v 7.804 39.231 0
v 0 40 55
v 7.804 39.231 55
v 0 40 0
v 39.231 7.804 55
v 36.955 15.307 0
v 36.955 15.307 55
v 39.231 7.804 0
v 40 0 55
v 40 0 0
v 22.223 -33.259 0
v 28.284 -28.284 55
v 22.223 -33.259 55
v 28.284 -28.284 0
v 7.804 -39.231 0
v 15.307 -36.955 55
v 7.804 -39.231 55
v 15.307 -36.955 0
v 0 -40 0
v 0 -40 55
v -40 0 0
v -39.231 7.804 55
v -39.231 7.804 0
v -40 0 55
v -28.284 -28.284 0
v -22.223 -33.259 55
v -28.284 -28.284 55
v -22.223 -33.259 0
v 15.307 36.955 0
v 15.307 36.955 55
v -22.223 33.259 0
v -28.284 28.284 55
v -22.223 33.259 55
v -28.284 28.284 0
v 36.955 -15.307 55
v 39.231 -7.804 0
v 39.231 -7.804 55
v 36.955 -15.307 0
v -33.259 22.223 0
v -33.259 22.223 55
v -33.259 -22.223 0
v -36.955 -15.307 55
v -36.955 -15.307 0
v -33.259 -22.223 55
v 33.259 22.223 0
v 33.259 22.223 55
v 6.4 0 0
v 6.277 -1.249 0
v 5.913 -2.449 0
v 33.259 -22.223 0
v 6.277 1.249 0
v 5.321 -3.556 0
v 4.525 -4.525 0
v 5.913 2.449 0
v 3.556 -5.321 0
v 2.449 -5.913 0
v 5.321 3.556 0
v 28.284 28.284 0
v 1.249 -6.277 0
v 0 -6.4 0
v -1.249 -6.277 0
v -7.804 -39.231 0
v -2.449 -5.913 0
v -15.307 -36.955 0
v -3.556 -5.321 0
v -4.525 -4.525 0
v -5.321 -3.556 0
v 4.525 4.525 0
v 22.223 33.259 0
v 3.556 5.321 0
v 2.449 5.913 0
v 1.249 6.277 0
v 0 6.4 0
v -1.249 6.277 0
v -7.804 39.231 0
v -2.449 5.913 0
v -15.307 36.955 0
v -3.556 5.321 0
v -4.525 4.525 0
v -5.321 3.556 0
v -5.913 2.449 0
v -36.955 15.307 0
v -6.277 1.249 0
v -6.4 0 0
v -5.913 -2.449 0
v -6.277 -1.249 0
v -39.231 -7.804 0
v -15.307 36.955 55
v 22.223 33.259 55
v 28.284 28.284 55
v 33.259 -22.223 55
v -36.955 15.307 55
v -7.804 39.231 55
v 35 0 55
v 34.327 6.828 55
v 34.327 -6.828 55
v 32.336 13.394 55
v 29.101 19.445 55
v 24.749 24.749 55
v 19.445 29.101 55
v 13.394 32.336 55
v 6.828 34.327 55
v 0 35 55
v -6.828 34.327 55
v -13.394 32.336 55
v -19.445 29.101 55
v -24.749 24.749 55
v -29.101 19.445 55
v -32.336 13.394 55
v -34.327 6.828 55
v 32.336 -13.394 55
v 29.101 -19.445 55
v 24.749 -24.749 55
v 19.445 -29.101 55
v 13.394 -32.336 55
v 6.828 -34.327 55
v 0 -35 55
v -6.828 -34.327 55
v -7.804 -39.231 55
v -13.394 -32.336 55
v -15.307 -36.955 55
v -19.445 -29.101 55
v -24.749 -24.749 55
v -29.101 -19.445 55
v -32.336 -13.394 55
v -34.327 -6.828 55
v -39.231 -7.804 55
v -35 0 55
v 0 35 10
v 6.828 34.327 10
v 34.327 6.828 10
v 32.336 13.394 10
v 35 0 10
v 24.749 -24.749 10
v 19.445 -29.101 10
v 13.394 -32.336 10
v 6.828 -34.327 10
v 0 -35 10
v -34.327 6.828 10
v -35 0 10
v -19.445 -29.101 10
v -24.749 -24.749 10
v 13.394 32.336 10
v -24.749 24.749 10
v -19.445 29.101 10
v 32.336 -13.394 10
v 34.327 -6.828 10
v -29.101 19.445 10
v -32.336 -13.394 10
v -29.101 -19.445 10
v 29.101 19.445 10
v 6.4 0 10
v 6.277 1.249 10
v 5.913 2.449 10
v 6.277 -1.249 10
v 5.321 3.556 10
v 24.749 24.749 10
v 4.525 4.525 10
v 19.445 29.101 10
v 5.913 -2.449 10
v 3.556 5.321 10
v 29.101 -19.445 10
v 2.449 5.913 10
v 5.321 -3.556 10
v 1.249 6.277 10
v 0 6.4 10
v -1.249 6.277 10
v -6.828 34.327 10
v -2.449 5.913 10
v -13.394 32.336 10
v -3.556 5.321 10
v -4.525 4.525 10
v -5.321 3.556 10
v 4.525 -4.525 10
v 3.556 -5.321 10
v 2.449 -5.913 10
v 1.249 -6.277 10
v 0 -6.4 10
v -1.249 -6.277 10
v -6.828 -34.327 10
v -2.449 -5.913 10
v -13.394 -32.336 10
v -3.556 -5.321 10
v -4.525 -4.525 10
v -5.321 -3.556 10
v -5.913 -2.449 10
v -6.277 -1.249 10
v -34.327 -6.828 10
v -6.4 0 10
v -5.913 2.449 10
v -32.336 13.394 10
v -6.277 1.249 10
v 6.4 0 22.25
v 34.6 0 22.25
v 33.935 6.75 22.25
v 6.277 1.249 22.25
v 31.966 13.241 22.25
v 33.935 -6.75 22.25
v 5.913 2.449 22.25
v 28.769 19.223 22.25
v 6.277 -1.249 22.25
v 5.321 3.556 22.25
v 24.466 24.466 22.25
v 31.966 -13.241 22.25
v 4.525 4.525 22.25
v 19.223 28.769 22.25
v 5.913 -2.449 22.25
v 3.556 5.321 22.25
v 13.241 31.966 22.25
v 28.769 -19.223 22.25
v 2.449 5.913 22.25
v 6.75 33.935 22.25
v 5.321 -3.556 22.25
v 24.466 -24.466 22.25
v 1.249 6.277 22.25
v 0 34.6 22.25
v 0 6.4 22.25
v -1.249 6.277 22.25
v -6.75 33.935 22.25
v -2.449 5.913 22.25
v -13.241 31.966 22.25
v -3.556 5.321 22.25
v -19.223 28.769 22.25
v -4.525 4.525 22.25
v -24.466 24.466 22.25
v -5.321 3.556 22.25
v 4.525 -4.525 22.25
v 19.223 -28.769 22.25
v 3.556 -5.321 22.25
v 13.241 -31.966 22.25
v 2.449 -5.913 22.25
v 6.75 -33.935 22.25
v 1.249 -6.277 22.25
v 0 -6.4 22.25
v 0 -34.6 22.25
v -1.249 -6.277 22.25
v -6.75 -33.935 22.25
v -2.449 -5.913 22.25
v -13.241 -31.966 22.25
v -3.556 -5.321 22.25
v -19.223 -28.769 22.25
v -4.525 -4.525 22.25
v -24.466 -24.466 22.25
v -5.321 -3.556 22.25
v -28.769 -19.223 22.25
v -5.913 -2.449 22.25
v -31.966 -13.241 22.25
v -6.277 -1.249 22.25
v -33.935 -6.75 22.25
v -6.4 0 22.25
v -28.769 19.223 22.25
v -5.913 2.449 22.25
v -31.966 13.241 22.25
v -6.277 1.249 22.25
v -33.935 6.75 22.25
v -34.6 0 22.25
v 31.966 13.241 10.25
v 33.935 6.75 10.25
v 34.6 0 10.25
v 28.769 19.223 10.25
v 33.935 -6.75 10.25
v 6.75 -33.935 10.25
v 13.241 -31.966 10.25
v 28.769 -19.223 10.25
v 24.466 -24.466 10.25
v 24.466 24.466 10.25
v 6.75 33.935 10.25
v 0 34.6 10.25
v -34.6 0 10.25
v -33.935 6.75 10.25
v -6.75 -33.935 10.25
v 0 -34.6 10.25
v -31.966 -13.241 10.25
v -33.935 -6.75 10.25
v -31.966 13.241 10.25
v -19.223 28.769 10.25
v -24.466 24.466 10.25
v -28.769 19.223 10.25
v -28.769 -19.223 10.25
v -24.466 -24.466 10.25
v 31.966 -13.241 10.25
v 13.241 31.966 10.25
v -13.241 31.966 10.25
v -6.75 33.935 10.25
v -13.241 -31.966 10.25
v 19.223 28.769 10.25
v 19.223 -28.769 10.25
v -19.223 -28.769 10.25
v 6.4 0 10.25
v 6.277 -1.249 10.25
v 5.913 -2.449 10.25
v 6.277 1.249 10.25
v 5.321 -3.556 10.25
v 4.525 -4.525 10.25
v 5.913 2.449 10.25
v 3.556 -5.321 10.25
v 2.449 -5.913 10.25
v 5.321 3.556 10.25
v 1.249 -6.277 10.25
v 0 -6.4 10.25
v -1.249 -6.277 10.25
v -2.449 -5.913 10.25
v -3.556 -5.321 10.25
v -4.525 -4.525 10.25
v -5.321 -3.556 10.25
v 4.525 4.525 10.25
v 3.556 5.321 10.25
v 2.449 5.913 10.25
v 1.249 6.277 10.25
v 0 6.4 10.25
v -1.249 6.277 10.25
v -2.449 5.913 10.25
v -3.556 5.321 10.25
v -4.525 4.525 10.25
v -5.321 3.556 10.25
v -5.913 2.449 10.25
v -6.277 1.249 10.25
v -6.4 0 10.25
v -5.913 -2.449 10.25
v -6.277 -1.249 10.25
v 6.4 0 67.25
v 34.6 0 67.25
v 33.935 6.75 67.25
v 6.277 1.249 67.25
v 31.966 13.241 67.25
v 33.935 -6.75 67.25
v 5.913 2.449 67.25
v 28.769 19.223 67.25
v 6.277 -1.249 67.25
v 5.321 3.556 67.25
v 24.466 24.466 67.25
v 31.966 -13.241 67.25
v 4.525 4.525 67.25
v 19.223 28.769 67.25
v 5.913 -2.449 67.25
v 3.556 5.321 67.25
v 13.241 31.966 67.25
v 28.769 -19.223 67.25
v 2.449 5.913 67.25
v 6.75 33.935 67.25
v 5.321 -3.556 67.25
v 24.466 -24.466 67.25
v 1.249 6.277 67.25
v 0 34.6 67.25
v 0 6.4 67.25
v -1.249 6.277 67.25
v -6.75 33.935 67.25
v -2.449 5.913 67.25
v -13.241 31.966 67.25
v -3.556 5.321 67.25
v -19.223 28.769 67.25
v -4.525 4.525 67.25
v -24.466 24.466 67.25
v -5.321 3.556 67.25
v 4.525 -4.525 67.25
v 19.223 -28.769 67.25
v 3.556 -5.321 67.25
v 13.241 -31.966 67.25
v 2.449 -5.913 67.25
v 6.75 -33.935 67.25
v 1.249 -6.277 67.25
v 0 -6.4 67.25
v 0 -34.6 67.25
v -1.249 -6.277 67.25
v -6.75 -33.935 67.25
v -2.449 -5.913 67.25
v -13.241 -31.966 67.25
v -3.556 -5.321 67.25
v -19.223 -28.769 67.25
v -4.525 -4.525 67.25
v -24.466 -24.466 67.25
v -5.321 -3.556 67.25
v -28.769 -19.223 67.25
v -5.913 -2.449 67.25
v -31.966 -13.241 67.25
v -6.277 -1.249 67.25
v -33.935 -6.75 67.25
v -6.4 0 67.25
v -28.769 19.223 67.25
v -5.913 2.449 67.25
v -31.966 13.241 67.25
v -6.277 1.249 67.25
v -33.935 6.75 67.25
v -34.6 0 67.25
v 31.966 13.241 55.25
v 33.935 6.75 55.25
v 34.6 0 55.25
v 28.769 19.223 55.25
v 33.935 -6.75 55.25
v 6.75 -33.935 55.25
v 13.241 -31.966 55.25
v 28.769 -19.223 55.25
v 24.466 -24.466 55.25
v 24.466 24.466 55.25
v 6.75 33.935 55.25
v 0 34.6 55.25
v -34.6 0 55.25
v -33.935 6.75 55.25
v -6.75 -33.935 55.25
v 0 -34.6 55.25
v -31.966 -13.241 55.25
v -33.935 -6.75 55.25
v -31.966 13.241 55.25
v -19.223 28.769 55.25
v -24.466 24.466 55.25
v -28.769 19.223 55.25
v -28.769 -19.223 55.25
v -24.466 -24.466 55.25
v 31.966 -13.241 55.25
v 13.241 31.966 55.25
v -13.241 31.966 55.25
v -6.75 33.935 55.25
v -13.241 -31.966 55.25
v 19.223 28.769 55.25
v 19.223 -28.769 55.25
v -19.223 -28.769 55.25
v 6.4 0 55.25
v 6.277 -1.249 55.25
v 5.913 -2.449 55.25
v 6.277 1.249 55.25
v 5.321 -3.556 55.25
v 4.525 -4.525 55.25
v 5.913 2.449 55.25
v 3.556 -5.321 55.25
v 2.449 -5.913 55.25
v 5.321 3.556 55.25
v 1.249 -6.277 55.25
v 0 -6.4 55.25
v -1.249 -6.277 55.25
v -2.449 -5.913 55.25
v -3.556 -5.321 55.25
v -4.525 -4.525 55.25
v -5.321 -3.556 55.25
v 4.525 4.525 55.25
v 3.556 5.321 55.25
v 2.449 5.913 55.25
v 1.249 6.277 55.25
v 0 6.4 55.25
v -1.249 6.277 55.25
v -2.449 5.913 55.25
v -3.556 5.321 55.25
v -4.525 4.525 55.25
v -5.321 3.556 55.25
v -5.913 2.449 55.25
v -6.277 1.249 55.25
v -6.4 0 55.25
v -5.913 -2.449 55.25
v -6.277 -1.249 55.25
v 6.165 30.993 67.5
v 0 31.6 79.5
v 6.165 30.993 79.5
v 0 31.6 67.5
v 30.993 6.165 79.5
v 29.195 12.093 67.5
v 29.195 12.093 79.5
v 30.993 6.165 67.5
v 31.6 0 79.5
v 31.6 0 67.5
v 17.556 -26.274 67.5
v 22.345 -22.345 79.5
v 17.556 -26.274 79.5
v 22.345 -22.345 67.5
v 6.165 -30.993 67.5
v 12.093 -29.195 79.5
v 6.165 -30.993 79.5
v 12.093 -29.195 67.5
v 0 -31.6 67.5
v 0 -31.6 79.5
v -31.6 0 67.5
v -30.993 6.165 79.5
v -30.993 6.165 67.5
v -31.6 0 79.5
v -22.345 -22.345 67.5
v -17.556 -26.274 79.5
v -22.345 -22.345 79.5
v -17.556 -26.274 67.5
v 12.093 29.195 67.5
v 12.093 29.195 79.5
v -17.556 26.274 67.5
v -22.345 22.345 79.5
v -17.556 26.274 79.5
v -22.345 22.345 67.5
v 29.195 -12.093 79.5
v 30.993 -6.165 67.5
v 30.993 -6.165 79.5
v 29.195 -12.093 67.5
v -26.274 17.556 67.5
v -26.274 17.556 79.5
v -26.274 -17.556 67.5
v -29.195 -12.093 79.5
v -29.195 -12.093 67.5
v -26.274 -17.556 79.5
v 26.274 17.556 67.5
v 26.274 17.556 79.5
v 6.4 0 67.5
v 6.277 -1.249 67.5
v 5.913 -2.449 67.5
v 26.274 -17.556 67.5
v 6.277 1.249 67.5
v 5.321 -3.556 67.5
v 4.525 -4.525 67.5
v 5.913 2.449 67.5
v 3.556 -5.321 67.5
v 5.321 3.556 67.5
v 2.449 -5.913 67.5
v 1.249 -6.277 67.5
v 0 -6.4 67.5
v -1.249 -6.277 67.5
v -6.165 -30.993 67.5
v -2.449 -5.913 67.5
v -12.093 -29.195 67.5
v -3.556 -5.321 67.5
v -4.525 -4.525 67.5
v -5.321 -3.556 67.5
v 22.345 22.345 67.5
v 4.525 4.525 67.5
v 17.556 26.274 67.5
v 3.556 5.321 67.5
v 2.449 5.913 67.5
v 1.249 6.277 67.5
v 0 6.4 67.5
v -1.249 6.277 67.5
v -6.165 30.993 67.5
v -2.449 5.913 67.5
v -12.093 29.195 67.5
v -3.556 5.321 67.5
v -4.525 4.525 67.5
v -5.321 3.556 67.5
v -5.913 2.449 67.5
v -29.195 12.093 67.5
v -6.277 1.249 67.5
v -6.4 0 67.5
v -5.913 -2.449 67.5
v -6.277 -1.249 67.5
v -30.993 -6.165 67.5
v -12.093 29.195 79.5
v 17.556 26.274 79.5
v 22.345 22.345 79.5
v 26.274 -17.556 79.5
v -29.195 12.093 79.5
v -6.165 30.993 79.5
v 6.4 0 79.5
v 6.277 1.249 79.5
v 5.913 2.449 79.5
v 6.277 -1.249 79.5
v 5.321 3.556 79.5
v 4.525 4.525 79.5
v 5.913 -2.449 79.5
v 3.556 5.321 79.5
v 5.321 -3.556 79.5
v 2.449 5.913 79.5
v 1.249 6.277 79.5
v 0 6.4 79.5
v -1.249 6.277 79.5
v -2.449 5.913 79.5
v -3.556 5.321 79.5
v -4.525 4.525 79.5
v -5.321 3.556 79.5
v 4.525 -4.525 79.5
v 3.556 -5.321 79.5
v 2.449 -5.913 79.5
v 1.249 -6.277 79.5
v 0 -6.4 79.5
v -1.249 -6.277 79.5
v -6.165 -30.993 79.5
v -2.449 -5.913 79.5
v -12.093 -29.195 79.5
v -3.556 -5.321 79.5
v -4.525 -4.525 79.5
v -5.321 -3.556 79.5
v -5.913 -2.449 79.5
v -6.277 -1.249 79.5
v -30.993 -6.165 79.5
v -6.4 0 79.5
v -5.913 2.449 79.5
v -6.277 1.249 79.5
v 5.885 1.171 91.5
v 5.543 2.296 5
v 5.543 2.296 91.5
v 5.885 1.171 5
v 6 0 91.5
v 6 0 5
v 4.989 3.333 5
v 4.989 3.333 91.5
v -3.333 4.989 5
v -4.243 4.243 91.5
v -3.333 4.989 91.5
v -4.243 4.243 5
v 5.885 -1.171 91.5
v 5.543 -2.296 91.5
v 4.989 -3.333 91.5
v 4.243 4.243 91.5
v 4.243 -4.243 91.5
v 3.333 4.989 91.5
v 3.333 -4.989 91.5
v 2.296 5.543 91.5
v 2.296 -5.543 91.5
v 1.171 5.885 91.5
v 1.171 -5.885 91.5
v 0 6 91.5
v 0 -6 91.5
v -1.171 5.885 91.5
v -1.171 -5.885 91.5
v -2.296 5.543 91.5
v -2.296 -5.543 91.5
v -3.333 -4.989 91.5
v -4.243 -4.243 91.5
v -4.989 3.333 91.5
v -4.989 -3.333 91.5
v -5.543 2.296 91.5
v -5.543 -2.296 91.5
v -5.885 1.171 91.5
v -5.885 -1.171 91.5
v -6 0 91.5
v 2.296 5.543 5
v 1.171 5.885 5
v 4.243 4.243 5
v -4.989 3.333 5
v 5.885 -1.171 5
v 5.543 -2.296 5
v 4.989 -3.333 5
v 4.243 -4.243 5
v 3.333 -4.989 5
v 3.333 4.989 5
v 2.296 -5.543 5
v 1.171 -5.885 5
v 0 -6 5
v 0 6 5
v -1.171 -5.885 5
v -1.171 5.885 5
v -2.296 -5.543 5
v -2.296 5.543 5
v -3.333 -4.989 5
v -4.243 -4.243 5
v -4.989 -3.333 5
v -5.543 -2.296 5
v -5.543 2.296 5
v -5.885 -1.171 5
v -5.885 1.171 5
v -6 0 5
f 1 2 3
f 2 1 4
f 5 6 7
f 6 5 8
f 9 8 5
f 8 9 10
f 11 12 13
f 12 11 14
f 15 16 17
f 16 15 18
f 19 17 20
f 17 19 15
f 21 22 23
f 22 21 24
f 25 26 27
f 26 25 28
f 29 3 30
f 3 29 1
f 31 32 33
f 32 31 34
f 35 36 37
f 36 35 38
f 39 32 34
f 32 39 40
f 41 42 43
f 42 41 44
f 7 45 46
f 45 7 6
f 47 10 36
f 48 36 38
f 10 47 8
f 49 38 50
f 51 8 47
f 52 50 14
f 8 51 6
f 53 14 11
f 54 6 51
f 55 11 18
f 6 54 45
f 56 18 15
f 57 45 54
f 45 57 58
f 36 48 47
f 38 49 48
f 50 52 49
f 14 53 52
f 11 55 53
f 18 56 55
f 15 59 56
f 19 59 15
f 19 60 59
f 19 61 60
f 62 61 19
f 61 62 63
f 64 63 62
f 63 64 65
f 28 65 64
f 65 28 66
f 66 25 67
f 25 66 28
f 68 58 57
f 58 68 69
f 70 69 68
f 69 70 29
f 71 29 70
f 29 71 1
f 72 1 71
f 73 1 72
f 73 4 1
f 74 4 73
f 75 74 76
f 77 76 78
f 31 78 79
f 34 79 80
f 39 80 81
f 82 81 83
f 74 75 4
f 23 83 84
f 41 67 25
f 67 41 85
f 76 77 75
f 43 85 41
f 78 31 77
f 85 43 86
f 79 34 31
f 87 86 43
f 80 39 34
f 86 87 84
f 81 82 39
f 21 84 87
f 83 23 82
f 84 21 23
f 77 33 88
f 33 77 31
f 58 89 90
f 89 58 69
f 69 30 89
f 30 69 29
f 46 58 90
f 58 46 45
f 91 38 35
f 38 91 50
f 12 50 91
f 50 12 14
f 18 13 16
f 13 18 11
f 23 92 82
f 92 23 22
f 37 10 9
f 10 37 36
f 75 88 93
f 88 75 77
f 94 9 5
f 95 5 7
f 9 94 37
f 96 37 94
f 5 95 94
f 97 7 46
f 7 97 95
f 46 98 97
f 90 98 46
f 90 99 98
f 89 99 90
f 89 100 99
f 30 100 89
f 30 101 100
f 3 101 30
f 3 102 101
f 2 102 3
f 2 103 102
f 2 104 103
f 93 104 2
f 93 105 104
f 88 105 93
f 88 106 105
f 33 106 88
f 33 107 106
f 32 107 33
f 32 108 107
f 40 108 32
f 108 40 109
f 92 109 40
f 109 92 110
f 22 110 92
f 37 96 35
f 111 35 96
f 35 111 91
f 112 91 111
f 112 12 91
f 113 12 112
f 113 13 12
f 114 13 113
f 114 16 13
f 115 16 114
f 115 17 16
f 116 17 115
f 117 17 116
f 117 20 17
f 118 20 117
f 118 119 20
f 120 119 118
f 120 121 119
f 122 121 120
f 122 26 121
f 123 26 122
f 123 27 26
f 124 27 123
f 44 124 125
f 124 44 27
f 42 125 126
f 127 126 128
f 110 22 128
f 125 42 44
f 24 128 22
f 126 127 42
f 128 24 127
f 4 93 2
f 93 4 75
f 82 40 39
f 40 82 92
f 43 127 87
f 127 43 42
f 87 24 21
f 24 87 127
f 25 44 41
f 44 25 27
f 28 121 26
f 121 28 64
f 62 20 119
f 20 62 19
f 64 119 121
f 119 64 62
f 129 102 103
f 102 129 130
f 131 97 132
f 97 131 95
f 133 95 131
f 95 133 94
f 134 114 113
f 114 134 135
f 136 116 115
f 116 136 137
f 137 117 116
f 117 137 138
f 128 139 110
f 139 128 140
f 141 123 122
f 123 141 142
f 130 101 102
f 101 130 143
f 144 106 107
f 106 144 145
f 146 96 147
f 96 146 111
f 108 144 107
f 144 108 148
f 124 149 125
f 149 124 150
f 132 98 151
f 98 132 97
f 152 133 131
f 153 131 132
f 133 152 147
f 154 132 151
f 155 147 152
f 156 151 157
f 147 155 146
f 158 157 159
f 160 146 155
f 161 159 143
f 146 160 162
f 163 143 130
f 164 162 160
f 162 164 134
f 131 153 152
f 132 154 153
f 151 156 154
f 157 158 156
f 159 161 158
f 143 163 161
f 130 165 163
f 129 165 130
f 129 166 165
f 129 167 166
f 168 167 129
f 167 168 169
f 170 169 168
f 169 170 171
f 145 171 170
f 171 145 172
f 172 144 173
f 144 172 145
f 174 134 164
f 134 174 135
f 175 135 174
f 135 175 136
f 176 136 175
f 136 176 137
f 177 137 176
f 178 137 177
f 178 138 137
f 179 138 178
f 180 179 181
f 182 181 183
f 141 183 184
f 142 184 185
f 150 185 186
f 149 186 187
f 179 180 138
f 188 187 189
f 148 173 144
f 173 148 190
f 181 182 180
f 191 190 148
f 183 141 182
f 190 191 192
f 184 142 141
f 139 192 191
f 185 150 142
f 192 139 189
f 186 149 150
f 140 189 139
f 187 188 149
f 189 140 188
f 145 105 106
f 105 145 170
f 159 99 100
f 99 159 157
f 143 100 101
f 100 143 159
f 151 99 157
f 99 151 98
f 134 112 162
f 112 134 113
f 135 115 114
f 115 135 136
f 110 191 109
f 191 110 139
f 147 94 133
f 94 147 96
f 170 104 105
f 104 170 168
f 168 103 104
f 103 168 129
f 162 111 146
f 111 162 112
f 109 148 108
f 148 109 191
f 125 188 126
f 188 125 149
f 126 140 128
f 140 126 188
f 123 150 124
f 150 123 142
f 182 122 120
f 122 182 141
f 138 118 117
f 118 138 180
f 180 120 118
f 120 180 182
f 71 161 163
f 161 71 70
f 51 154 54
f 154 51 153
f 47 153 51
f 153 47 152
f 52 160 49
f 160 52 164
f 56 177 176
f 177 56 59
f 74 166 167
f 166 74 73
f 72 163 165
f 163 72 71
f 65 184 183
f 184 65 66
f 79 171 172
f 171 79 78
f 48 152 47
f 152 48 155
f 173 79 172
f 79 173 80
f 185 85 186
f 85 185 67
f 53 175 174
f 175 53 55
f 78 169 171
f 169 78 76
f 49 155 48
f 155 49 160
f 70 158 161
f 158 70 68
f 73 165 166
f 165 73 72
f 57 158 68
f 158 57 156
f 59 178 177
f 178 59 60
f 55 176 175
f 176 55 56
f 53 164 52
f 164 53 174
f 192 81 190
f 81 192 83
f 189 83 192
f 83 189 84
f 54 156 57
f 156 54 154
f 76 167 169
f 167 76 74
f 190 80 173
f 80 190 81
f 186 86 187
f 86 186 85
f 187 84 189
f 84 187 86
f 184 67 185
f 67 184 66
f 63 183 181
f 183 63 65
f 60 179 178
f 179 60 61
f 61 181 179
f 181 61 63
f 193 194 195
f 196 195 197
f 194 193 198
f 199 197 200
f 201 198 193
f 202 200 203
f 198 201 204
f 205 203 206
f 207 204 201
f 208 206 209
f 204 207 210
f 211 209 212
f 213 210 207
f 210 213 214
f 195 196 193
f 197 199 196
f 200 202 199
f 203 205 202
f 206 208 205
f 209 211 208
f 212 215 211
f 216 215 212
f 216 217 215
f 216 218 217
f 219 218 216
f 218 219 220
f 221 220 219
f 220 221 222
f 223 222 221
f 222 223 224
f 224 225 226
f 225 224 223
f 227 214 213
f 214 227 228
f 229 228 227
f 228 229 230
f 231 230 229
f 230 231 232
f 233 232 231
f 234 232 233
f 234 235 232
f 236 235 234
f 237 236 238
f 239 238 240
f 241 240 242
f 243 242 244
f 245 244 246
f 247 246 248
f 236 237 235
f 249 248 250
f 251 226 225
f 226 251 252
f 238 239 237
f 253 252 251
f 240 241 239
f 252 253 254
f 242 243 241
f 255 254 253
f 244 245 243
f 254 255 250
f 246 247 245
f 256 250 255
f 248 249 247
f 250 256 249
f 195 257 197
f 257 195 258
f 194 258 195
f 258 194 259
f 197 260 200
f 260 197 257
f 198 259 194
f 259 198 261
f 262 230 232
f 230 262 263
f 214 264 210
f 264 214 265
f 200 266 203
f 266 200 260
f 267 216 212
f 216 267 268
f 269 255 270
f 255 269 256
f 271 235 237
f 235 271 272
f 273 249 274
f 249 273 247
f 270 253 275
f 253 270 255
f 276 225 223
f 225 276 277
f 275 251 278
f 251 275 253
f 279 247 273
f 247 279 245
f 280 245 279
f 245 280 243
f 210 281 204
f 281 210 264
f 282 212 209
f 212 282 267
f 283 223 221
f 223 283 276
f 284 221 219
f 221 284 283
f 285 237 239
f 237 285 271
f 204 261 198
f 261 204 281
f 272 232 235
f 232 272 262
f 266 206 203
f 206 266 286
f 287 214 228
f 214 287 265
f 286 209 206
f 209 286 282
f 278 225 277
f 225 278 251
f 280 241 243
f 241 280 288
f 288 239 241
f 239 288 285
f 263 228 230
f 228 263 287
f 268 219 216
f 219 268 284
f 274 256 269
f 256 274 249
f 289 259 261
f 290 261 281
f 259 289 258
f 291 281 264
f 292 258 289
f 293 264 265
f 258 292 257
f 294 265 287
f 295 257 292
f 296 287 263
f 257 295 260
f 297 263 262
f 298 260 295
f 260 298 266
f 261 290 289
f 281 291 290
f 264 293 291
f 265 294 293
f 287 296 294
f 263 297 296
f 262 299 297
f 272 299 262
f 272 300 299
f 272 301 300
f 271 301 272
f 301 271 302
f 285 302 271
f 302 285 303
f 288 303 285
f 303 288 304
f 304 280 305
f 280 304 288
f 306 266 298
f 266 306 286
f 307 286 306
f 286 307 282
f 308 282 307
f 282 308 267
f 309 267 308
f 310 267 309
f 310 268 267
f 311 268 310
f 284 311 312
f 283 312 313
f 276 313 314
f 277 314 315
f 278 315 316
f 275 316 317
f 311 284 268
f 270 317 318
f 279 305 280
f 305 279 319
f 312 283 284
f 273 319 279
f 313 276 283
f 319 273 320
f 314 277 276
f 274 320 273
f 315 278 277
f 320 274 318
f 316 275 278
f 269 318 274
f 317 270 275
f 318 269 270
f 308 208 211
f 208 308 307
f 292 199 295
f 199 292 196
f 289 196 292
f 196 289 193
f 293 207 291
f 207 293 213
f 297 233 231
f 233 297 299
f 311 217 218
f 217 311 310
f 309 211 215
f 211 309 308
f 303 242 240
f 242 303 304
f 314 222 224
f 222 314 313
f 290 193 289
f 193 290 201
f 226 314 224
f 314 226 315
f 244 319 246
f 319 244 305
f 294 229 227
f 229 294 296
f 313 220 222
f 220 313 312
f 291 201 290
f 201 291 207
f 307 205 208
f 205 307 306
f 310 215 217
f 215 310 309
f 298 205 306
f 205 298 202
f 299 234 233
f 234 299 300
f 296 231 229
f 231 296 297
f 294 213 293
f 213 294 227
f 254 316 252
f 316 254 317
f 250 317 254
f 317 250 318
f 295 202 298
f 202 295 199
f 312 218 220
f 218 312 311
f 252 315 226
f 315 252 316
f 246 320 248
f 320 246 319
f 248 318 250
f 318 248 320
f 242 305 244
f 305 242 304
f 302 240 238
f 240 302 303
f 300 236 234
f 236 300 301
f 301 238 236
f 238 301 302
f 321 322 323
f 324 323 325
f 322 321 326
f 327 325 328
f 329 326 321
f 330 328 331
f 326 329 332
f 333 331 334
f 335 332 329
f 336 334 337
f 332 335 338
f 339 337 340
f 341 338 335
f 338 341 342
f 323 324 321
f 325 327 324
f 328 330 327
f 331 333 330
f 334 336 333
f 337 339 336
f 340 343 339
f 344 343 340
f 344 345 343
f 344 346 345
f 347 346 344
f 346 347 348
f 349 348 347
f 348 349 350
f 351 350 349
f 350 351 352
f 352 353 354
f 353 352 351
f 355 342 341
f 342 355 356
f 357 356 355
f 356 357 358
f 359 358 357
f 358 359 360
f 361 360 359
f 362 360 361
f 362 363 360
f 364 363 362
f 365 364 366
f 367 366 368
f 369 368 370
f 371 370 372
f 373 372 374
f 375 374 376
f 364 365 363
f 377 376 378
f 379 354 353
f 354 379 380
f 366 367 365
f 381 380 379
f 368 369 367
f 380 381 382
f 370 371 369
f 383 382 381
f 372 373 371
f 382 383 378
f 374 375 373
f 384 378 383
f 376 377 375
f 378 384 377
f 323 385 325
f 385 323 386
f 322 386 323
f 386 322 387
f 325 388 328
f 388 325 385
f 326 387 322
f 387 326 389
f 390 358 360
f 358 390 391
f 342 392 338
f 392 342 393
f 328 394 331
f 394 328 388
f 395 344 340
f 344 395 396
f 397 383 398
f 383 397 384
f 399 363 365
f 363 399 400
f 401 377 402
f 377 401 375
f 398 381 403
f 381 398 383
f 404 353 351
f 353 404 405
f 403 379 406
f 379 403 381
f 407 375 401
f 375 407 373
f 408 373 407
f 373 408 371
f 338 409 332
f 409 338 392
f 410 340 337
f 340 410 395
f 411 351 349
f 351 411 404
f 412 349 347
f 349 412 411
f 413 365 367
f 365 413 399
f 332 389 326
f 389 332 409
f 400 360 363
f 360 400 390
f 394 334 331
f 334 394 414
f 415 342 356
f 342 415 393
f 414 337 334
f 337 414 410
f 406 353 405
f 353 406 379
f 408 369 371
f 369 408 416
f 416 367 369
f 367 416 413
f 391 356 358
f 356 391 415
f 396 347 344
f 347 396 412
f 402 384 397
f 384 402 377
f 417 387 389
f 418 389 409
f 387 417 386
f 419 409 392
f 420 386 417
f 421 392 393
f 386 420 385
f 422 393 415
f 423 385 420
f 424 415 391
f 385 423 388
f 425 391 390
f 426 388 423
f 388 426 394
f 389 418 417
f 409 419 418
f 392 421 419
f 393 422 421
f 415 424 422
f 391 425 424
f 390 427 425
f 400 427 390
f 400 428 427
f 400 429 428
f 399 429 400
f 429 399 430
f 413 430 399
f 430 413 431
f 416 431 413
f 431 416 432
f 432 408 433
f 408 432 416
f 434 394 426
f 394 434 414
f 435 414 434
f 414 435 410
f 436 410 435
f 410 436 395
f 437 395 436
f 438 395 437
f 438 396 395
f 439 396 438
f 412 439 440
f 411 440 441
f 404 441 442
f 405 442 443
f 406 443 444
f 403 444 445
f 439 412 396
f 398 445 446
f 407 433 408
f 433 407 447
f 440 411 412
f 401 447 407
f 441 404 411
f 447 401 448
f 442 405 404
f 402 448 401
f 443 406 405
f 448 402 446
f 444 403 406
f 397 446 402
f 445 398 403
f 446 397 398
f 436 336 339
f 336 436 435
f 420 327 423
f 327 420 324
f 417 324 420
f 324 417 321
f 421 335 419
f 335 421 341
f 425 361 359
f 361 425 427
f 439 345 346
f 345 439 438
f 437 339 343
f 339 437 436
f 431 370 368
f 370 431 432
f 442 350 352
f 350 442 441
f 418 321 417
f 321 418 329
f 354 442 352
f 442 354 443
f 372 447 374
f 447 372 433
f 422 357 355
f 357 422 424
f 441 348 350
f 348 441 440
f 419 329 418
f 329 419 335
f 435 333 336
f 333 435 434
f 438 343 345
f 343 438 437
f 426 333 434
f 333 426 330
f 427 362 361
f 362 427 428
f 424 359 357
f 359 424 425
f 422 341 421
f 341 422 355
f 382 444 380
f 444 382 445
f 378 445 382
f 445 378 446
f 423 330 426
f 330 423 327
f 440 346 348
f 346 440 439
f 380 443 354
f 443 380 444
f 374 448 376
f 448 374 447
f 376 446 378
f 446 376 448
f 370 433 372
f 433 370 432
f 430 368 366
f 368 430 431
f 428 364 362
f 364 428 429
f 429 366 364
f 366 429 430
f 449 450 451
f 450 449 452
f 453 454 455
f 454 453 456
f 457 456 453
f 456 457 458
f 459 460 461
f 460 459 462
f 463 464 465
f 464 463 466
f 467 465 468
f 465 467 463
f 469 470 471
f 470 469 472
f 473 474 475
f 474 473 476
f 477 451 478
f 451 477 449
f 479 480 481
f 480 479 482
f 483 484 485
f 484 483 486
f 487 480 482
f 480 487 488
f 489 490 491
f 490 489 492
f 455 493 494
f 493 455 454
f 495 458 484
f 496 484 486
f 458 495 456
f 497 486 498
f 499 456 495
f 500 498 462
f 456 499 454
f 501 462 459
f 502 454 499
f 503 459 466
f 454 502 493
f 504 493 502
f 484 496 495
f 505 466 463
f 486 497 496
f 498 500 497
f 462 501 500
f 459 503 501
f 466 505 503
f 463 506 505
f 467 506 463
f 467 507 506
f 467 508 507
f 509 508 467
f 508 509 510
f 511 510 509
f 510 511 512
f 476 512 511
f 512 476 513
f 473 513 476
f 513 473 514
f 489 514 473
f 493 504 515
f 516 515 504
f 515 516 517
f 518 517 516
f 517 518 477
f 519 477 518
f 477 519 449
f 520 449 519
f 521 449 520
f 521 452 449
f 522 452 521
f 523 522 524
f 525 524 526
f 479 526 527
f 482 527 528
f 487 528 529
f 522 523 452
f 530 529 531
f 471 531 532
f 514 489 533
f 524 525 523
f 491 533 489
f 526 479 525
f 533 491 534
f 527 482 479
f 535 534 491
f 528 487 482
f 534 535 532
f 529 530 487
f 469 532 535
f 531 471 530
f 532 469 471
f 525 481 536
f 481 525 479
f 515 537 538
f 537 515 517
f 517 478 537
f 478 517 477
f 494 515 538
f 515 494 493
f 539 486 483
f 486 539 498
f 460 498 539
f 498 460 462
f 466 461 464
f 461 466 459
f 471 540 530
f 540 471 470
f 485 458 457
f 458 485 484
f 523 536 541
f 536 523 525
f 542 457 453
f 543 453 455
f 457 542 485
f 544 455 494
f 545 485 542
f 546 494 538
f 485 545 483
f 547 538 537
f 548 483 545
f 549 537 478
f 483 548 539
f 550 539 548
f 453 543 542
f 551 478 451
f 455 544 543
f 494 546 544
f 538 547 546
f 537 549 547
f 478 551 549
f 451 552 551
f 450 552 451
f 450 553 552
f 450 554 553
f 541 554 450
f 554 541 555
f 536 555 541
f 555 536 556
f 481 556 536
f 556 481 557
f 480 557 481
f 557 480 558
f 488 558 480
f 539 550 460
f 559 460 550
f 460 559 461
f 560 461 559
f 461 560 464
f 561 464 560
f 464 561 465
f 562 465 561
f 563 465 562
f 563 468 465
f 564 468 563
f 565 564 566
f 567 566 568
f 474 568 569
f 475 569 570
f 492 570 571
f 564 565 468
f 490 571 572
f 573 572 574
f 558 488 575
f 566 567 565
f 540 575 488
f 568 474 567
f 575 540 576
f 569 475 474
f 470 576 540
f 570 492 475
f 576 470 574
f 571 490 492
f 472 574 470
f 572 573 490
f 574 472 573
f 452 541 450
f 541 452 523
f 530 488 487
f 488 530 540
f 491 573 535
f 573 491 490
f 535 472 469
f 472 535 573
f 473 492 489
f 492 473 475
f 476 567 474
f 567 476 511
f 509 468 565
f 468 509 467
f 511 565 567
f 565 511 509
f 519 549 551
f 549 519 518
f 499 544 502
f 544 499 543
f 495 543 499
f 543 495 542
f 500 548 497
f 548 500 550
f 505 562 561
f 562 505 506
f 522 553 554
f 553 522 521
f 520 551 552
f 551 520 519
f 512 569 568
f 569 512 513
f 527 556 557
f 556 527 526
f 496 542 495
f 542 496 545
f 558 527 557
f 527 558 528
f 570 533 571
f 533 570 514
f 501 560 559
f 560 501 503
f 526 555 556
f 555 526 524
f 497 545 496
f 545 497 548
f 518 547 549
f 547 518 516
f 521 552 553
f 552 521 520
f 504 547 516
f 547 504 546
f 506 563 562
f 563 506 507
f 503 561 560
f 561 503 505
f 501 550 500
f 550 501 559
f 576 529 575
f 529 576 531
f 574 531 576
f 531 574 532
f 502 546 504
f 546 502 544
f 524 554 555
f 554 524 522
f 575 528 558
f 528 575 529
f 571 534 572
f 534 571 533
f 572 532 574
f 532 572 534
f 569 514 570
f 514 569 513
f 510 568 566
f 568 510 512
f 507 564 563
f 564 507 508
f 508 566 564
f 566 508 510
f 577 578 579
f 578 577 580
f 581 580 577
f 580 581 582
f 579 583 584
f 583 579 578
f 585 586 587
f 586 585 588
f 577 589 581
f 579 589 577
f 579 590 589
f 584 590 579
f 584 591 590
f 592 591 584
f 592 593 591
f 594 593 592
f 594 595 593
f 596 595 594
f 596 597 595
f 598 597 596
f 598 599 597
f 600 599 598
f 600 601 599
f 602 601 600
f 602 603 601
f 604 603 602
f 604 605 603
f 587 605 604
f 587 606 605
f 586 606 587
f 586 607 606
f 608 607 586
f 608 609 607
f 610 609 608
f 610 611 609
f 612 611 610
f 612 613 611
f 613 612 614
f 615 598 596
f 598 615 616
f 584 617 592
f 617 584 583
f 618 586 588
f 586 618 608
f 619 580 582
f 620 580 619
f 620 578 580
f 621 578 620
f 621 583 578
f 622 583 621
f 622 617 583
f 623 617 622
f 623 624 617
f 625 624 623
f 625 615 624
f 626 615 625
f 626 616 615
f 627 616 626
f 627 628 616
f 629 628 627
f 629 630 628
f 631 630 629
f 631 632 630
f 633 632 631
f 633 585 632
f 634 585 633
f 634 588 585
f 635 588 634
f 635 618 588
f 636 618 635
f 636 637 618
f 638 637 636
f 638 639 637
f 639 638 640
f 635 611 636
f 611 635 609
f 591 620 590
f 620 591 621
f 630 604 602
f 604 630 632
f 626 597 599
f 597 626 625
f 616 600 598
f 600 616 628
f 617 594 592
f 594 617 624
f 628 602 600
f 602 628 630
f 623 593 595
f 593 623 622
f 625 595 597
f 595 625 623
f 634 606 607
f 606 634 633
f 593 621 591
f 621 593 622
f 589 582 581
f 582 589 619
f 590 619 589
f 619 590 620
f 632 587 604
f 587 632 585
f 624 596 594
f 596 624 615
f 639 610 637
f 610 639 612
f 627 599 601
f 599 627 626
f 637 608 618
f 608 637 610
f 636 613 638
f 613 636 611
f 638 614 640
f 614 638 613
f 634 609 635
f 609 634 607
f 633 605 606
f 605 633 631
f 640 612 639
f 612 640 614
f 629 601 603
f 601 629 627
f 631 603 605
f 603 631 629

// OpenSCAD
$fn = 32;

// ------------------------------------------------------------------------
// Bearing housing: housing d80, two bearings and a shaft
// Every part is its own module, assembly() places them once.
// ------------------------------------------------------------------------

// --- part 1 ---
module housing() {
  difference() {
    cylinder(h = 55, d = 80);
    translate([0, 0, 10]) cylinder(h = 46, d = 70);
    translate([0, 0, -1]) cylinder(h = 12, d = 12.8);
  }
}

// --- part 2 ---
module bearing_lower() {
  difference() {
      translate([0, 0, 0]) cylinder(h = 12, d = 69.2);
      translate([0, 0, -1]) cylinder(h = 14, d = 12.8);
    }
}

// --- part 3 ---
module bearing_upper() {
  difference() {
      translate([0, 0, 0]) cylinder(h = 12, d = 69.2);
      translate([0, 0, -1]) cylinder(h = 14, d = 12.8);
    }
}

// --- part 4 ---
module spacer() {
  difference() {
      translate([0, 0, 0]) cylinder(h = 12, d = 63.2);
      translate([0, 0, -1]) cylinder(h = 14, d = 12.8);
    }
}

// --- part 5 ---
module shaft() {
  translate([0, 0, -43.25]) cylinder(h = 86.5, d = 12);
}

// --- assembly ---
module assembly() {
  translate([0, 0, 0]) rotate([0, 0, 0]) housing();
  translate([0, 0, 10.25]) rotate([0, 0, 0]) bearing_lower();
  translate([0, 0, 55.25]) rotate([0, 0, 0]) bearing_upper();
  translate([0, 0, 67.5]) rotate([0, 0, 0]) spacer();
  translate([0, 0, 48.25]) rotate([0, 0, 0]) shaft();
}

assembly();
